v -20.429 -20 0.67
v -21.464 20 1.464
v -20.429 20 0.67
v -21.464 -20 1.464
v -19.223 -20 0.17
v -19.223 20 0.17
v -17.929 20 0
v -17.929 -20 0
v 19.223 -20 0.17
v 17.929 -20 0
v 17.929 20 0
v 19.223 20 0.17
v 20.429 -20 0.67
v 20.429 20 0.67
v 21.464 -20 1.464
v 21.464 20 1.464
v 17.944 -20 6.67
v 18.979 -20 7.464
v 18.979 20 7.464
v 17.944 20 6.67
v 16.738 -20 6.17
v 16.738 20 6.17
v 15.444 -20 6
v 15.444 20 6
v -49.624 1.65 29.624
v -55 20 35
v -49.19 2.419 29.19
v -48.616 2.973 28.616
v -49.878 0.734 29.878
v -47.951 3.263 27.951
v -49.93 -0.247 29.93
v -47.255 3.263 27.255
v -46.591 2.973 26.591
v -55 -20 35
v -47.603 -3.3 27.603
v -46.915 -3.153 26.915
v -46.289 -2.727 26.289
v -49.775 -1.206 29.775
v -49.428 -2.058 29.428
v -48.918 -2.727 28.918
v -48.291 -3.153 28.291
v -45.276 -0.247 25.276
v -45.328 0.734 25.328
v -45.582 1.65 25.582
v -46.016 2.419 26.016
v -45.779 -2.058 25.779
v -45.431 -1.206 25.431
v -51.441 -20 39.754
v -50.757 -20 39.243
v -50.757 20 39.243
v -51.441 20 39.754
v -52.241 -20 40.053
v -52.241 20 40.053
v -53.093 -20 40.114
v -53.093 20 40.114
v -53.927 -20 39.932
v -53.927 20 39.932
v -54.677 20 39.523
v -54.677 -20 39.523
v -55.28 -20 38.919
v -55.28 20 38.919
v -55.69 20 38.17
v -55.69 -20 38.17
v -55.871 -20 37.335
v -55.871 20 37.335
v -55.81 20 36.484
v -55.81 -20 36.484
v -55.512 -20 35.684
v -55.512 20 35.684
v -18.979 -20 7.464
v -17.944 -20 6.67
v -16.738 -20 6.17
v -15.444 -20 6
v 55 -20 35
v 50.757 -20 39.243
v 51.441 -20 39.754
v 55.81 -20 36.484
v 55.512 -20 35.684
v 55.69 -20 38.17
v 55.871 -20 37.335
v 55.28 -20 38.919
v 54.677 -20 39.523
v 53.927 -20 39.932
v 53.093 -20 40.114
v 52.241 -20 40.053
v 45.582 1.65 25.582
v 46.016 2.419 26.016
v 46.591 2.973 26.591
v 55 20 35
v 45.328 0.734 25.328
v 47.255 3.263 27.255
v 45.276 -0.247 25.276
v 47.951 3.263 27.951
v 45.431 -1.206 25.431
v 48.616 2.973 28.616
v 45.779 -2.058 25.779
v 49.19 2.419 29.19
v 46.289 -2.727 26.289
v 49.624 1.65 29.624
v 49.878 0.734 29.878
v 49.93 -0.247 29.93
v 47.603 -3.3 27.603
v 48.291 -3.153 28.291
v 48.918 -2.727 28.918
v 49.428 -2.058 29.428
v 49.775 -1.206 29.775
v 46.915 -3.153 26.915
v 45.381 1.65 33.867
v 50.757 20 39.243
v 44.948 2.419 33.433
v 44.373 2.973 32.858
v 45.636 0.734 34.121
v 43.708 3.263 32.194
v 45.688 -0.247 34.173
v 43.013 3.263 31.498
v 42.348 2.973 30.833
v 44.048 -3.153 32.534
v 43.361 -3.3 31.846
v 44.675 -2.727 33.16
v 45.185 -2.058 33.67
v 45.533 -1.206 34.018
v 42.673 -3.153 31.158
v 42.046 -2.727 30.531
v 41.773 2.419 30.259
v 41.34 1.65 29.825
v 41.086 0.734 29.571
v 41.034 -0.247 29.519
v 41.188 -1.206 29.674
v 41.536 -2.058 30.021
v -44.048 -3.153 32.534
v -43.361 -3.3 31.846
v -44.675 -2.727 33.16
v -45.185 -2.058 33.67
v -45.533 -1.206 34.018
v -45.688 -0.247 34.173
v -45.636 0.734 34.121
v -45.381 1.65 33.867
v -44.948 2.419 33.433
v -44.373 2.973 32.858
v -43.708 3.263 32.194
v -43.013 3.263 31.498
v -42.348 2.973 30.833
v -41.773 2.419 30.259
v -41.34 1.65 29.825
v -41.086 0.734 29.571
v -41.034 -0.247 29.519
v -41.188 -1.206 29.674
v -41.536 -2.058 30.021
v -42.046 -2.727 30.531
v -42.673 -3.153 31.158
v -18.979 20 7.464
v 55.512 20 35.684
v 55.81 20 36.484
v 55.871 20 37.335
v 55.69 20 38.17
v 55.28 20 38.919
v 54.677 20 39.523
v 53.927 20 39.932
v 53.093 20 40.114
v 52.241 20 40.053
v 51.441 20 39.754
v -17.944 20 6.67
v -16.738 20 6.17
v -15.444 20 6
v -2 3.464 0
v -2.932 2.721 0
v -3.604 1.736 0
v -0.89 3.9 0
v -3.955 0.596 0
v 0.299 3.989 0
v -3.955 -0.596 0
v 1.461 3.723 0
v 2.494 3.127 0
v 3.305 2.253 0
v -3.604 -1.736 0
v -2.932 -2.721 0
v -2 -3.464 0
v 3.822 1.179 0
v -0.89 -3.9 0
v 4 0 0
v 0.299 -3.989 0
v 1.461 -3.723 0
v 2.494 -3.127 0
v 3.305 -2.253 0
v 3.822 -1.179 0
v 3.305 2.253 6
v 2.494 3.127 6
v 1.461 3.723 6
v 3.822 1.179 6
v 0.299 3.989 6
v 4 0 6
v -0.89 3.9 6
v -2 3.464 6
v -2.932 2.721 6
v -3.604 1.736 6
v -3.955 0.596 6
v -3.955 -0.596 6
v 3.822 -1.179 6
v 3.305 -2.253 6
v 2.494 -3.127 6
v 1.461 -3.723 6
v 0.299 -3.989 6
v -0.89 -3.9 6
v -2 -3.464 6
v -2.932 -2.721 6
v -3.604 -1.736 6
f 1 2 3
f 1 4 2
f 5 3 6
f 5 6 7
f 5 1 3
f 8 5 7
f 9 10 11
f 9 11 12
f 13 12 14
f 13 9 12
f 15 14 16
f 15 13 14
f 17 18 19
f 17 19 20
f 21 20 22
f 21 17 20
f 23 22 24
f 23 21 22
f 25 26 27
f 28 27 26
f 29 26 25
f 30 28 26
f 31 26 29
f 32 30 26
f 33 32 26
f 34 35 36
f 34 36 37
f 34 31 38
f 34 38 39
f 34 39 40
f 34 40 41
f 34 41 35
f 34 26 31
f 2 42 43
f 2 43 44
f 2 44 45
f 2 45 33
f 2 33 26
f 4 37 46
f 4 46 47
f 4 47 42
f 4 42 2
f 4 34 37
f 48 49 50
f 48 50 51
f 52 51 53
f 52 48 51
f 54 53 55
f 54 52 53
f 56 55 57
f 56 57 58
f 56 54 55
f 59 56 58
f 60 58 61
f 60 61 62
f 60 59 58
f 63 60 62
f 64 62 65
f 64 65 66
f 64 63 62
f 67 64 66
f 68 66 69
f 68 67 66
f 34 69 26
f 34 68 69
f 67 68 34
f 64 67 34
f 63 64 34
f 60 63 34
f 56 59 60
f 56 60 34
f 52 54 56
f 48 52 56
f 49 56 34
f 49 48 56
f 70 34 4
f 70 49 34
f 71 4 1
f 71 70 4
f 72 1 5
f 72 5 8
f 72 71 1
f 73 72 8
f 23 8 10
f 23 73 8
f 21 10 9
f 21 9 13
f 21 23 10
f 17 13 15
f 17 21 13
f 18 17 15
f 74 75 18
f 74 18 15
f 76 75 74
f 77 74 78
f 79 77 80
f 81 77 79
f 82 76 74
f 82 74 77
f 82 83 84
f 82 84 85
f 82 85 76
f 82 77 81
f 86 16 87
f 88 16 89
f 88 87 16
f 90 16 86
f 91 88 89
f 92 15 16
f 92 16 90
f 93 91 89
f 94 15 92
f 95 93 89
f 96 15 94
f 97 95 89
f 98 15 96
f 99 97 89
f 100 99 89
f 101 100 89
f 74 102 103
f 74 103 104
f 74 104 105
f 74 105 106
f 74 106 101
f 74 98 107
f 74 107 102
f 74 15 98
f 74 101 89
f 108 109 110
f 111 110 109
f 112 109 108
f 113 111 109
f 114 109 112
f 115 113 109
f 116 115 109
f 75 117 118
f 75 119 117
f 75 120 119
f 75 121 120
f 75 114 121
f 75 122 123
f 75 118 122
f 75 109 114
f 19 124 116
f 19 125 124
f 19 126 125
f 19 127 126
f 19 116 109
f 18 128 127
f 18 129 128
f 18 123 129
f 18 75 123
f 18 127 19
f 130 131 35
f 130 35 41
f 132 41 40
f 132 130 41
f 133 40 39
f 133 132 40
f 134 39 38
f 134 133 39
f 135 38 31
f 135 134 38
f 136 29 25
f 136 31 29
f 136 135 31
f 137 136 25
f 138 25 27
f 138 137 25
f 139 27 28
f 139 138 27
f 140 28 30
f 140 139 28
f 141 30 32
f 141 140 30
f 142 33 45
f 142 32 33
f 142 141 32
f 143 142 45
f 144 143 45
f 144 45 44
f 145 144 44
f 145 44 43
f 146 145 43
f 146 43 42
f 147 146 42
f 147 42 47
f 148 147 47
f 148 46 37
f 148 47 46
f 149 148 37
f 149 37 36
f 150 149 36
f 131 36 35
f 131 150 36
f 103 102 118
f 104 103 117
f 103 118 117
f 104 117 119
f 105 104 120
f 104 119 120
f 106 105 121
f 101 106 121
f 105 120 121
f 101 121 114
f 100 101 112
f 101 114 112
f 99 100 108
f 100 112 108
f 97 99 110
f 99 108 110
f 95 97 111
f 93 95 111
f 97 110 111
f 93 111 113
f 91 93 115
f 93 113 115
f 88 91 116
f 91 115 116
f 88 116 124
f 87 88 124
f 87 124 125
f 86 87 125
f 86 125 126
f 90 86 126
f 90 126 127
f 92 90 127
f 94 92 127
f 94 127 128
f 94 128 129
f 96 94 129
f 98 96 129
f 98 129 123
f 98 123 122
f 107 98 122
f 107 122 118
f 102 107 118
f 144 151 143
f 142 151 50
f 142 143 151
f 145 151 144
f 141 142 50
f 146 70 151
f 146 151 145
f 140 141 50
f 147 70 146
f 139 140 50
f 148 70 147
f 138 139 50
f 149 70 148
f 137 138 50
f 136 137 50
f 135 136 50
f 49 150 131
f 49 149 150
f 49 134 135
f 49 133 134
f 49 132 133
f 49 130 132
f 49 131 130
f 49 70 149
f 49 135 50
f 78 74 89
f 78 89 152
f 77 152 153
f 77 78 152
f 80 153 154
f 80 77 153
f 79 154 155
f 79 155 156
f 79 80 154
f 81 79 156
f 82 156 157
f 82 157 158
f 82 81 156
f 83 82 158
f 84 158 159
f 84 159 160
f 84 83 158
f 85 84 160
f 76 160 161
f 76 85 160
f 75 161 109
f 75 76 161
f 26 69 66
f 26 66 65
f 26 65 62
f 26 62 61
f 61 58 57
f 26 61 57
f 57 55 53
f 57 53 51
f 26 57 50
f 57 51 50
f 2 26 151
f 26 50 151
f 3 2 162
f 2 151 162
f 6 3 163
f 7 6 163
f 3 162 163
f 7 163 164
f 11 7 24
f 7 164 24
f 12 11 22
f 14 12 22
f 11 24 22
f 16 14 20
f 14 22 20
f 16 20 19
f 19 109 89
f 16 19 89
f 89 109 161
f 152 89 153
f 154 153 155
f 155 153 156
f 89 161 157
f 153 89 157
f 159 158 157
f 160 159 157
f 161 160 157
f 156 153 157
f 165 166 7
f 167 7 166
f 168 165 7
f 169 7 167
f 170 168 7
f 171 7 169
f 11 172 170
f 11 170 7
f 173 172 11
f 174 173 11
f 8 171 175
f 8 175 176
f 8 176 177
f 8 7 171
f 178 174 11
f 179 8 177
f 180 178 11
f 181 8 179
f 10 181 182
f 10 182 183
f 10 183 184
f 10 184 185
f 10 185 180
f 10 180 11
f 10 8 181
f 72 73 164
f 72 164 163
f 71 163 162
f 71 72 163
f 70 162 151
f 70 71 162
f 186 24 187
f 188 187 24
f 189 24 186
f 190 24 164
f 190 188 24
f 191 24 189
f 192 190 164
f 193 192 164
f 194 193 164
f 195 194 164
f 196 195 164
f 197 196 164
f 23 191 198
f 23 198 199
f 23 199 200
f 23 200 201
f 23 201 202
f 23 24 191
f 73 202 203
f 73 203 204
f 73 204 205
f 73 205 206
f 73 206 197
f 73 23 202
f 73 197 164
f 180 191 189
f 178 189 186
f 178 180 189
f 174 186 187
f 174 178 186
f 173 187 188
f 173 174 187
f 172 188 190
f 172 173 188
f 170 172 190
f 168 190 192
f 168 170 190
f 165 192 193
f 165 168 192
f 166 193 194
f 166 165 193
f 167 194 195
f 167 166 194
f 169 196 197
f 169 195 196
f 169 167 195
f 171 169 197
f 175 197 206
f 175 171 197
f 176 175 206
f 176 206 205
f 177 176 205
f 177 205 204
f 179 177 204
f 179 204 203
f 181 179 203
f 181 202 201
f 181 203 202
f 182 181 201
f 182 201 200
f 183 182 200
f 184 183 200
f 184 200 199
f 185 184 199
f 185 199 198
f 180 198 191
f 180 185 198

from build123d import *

# Parameters (mm, degrees)
F1_DEPTH = 20
F2_R     = 4
F3_DEPTH = 40.1223203436
F6_D     = 6.6


# Not quite as in the source:
# - a pattern or mirror of a feature is missing from the dataset's text; its kind, count and spacing are read off the source's solid


with BuildPart() as f1:
    # F0 (on Front) → F1 (new body, symmetric)
    with BuildSketch(Plane.XZ):
        with BuildLine():
            Line((-17.9289321881, 0), (0, 0))
            Line((0, 0), (17.9289321881, 0))
            ThreePointArc((17.9289321881, 0), (19.84234935, 0.3806023374), (21.4644660941, 1.4644660941))
            Line((21.4644660941, 1.4644660941), (55, 35))
            ThreePointArc((55, 35), (55, 39.2426406871), (50.7573593129, 39.2426406871))
            Line((50.7573593129, 39.2426406871), (18.9791847198, 7.4644660941))
            ThreePointArc((18.9791847198, 7.4644660941), (17.3570679757, 6.3806023374), (15.4436508139, 6))
            Line((15.4436508139, 6), (0, 6))
            Line((0, 6), (-15.4436508139, 6))
            ThreePointArc((-15.4436508139, 6), (-17.3570679757, 6.3806023374), (-18.9791847198, 7.4644660941))
            Line((-18.9791847198, 7.4644660941), (-50.7573593129, 39.2426406871))
            ThreePointArc((-50.7573593129, 39.2426406871), (-55, 39.2426406871), (-55, 35))
            Line((-55, 35), (-21.4644660941, 1.4644660941))
            ThreePointArc((-21.4644660941, 1.4644660941), (-19.84234935, 0.3806023374), (-17.9289321881, 0))
        make_face()
    extrude(amount=F1_DEPTH, both=True)

    # F2 (on Top) → F3 (cut, through all)
    with BuildSketch(Plane.XY):
        Circle(F2_R)
    extrude(amount=F3_DEPTH, mode=Mode.SUBTRACT)

    # F6 (through all)
    with Locations(Plane(origin=(10, 0, -10), x_dir=(0, 1, 0), z_dir=(0.7071067812, 0, -0.7071067812))):
        with Locations((0, 53.1789772213)):
            f6 = Hole(F6_D / 2)

    # F6_copies: F6 across plane
    add(f6.mirror(Plane(origin=(0, 0, 0), x_dir=(0, 0, -1), z_dir=(-1, 0, 0))), mode=Mode.SUBTRACT)


solid = f1.part
